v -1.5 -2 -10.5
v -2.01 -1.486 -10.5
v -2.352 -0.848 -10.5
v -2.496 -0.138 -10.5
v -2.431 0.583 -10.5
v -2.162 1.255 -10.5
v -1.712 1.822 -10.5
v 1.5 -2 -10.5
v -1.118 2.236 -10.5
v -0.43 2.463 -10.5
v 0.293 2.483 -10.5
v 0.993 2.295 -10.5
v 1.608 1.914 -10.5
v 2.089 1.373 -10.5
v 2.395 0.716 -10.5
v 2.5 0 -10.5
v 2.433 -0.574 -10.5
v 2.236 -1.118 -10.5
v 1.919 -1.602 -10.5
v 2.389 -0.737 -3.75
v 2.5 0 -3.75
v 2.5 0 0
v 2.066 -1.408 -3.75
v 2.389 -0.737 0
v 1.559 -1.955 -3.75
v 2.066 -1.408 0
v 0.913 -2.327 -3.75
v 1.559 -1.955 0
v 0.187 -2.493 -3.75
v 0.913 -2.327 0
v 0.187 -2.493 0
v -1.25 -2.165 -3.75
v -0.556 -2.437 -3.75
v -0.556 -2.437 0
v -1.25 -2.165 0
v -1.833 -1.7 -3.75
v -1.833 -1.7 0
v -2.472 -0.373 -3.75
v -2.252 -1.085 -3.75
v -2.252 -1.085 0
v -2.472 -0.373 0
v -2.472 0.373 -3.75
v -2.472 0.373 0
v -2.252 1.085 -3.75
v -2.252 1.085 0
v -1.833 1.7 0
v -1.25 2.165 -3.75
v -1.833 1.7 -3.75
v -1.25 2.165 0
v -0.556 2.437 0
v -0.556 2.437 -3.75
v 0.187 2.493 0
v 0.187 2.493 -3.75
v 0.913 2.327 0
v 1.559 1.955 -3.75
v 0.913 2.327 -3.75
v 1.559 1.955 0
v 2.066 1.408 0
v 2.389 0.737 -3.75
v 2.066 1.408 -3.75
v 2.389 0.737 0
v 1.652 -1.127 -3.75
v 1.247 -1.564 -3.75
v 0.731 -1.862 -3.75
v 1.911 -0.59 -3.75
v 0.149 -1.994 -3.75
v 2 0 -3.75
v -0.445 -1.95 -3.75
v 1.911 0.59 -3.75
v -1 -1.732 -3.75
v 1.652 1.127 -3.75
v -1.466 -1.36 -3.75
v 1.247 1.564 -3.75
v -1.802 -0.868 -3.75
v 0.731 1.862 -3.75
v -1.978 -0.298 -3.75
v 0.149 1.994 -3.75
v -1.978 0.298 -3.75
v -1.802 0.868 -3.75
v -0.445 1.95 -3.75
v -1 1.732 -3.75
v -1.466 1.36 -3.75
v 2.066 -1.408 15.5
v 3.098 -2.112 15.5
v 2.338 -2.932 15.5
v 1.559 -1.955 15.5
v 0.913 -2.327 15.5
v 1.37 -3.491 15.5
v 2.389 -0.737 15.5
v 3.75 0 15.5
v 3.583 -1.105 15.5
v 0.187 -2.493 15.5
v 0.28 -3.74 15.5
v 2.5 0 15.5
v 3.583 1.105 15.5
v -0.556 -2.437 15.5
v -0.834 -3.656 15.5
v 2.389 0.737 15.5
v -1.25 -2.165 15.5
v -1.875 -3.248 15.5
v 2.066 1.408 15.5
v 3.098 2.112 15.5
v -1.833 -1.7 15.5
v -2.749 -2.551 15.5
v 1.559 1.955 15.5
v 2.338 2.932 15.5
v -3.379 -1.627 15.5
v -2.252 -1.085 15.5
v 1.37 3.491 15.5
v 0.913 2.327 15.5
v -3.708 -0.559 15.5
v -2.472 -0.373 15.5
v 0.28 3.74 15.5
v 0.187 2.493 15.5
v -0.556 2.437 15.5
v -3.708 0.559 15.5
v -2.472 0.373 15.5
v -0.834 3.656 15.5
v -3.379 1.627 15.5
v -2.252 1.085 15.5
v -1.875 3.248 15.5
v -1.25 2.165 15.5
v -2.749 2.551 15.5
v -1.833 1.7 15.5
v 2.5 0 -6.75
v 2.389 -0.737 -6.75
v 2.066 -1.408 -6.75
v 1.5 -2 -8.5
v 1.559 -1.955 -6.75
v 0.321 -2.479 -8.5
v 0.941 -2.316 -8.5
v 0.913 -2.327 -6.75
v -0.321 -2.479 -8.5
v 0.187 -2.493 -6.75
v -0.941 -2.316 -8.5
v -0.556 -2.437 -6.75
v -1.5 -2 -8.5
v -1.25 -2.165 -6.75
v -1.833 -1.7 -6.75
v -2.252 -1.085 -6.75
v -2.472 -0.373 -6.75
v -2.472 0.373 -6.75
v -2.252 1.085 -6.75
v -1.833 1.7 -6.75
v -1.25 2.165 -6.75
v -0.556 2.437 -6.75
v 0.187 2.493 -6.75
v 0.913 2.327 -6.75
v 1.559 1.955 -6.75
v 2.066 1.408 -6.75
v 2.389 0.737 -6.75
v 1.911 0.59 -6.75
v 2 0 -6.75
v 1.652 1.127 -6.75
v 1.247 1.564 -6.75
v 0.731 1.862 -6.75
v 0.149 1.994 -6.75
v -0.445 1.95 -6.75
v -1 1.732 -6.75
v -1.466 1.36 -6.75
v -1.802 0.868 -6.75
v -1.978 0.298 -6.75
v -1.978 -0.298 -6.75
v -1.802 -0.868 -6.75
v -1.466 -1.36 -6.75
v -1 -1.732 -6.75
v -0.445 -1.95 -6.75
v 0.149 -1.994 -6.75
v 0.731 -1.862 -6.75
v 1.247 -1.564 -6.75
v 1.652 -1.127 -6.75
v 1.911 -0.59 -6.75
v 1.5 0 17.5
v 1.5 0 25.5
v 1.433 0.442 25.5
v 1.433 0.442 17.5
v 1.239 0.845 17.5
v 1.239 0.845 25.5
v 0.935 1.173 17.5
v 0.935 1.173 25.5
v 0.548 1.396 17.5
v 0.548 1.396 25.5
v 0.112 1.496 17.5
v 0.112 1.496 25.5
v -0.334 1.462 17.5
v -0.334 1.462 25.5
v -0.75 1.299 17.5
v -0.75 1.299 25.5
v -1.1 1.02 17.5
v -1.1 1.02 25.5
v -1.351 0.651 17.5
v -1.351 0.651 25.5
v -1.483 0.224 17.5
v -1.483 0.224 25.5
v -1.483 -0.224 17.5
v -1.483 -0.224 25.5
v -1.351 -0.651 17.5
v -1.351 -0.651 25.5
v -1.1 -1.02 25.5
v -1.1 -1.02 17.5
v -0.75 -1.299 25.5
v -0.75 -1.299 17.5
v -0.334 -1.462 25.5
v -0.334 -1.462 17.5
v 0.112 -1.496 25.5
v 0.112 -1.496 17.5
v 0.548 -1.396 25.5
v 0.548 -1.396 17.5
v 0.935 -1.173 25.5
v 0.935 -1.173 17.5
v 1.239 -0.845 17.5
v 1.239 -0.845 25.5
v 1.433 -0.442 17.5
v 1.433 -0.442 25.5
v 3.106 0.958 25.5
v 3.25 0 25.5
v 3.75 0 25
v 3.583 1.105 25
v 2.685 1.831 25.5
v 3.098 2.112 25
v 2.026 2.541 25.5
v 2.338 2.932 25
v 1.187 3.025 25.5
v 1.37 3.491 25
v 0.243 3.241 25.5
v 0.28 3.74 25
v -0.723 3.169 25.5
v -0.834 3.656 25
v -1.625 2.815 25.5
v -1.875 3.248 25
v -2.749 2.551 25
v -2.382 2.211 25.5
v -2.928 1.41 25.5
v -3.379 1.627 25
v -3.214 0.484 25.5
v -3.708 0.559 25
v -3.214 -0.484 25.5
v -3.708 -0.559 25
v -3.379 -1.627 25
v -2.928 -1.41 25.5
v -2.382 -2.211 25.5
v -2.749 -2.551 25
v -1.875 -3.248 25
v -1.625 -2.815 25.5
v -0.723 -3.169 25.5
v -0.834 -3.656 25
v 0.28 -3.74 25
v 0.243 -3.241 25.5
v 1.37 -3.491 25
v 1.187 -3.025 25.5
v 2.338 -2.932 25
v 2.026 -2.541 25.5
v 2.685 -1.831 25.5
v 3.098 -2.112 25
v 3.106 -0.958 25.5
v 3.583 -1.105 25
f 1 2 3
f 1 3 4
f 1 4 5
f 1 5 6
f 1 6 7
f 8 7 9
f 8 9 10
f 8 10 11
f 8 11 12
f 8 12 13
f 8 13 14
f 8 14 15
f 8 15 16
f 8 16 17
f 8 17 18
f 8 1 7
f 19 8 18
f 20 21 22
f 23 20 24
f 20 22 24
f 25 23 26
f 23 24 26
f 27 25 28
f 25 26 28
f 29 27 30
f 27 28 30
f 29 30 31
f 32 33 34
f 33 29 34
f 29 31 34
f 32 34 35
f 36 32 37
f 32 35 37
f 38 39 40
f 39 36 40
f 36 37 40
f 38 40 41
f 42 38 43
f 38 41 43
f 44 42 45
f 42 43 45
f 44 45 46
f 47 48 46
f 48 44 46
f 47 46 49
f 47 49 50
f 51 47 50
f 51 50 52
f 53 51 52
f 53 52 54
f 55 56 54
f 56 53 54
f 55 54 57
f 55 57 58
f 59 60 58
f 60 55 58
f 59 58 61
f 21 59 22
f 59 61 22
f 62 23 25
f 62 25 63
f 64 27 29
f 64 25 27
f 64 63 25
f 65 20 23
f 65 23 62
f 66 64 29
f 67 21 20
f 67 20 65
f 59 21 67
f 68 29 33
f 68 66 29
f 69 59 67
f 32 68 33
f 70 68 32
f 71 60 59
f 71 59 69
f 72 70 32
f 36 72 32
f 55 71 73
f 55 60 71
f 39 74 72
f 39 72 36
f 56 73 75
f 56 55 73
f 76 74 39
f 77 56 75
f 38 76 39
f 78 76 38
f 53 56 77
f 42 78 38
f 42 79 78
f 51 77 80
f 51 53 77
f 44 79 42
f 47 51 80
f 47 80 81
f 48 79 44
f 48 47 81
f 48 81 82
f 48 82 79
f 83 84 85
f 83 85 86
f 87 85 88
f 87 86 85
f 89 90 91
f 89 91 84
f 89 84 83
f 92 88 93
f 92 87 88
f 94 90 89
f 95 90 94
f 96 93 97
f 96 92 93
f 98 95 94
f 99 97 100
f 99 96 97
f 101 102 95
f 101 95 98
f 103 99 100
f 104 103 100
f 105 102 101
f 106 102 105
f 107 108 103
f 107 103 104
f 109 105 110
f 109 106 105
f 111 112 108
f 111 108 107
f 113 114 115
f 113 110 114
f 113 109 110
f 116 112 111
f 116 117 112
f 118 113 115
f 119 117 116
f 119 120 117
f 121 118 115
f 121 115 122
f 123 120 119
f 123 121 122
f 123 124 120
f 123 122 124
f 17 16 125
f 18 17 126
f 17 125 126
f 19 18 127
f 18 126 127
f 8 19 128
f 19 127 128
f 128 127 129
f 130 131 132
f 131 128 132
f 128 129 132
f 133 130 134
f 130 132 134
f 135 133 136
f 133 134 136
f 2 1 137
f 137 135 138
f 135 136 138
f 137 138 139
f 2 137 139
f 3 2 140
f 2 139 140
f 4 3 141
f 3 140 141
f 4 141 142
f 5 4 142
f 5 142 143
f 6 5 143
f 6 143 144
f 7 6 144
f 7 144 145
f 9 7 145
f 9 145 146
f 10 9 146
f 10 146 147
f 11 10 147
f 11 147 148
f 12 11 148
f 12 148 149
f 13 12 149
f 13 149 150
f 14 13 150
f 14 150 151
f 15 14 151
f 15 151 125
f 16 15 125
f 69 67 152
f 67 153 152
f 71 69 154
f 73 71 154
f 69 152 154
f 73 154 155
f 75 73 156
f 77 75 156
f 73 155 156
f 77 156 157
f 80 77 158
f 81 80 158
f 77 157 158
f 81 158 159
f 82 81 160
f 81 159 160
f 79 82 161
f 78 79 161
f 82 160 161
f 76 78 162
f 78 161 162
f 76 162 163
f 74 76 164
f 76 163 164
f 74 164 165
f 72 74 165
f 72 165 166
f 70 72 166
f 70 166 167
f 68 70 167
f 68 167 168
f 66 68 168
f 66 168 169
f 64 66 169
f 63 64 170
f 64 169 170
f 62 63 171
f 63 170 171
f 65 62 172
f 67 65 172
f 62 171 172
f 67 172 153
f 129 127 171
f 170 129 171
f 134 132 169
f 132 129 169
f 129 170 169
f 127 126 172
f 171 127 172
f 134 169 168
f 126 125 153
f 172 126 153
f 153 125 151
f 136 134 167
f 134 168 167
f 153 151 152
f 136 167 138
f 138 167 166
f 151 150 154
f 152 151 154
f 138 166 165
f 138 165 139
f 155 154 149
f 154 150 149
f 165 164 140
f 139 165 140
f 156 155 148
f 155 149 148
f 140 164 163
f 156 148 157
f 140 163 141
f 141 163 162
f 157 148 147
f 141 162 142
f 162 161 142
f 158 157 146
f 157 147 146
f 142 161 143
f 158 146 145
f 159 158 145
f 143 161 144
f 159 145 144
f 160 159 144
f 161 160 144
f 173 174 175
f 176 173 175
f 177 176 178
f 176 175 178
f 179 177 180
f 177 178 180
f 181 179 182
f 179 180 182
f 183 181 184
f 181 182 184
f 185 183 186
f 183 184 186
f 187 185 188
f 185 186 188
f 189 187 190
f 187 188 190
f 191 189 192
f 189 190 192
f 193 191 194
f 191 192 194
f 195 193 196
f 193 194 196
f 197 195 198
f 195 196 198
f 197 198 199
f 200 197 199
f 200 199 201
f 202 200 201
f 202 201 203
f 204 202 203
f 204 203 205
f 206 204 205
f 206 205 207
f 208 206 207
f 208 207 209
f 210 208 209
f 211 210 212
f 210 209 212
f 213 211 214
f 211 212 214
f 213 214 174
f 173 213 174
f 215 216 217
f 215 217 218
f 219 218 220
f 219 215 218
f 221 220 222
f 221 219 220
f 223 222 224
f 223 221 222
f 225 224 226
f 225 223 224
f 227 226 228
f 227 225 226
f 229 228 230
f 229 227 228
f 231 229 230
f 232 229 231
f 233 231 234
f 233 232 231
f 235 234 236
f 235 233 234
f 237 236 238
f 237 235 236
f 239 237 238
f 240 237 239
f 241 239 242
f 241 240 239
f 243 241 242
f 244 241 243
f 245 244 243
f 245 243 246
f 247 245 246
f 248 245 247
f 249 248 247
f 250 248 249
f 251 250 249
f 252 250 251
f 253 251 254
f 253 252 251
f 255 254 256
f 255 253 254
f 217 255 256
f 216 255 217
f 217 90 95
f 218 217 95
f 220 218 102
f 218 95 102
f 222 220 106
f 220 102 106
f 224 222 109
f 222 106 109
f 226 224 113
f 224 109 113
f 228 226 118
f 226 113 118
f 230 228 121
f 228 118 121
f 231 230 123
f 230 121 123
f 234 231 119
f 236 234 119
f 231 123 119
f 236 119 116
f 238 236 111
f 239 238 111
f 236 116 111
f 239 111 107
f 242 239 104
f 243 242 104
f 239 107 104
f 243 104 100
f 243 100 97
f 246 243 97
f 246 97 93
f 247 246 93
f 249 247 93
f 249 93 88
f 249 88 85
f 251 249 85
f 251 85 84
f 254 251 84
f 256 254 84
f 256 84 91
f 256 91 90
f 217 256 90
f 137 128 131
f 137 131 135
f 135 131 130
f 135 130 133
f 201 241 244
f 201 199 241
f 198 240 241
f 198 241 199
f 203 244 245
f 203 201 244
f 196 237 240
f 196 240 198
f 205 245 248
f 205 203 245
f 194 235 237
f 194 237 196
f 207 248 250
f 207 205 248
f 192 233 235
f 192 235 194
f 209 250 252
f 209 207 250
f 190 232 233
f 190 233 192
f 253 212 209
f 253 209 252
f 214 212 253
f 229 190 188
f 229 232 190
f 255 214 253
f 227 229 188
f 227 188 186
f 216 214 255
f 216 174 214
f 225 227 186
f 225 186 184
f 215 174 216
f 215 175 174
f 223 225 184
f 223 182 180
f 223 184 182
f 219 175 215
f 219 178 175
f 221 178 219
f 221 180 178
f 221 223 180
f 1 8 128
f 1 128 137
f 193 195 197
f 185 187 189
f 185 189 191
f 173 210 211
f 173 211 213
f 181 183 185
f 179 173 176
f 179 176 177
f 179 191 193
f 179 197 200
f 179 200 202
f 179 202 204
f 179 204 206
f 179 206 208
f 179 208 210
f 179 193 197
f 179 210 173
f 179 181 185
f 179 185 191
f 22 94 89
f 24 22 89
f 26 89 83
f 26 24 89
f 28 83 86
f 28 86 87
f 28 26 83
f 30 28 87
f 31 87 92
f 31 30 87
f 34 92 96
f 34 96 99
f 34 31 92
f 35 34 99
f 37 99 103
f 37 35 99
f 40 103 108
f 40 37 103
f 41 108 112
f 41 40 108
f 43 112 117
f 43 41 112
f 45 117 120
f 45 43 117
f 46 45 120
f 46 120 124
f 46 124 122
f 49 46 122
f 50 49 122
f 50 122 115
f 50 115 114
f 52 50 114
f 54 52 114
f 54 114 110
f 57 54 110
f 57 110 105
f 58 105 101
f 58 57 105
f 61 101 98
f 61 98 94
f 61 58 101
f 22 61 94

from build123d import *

# Parameters (mm, degrees)
ESQUISSE1_R             = 3.75
EXTRUSION1_DEPTH        = 25.5
ESQUISSE2_R             = 2.5
EXTRUSION2_DEPTH        = 10.5
ESQUISSE3_R             = 1.5
ENL_V_MAT_EXTRU_1_DEPTH = 8
ESQUISSE5_W             = 3.097754454
ESQUISSE5_H             = 3
ESQUISSE6_W             = 5.14619883
ESQUISSE6_H             = 0.986249407
ENL_V_MAT_EXTRU_3_DEPTH = 2
ESQUISSE8_OUTSIDE_W     = 17.006
ESQUISSE8_OUTSIDE_H     = 17.006
ESQUISSE8_OUTSIDE_R     = 2.5
EXTRUSION5_DEPTH        = 15.5
CHANFREIN1_SIZE         = 0.5


with BuildPart() as part:
    # Esquisse1 → Extrusion1 (new body)
    with BuildSketch(Plane.XY):
        Circle(ESQUISSE1_R)
    extrude(amount=EXTRUSION1_DEPTH)

    # Esquisse2 → Extrusion2 (add)
    with BuildSketch(Plane(origin=(0, 0, 0), x_dir=(-1, 0, 0), z_dir=(0, 0, -1))):
        with Locations(Location((0, 0, 0), (0, 0, 180))):
            Circle(ESQUISSE2_R)
    extrude(amount=EXTRUSION2_DEPTH)

    # Esquisse3 → Enlèv. mat.-Extru.1 (cut)
    with BuildSketch(Plane.XY.offset(25.5)):
        Circle(ESQUISSE3_R)
    extrude(amount=-ENL_V_MAT_EXTRU_1_DEPTH, mode=Mode.SUBTRACT)

    # Esquisse5 → Enlèvement de matière-Révolution1 (revolve, cut)
    with BuildSketch(Plane(origin=(0, 0, 0), x_dir=(1, 0, 0), z_dir=(0, 1, 0))):
        with Locations((3.548877227, 5.25)):
            Rectangle(ESQUISSE5_W, ESQUISSE5_H)
    revolve(axis=Axis((0, 0, -10.5), (0, 0, 1)), mode=Mode.SUBTRACT)

    # Esquisse6 → Enlèv. mat.-Extru.3 (cut)
    with BuildSketch(Plane(origin=(0, 0, -10.5), x_dir=(-1, 0, 0), z_dir=(0, 0, -1))):
        with Locations((0.031610558, -2.493124704)):
            Rectangle(ESQUISSE6_W, ESQUISSE6_H)
    extrude(amount=-ENL_V_MAT_EXTRU_3_DEPTH, mode=Mode.SUBTRACT)

    # Esquisse8 outside → Extrusion5 (cut)
    with BuildSketch(Plane(origin=(0, 0, 0), x_dir=(-1, 0, 0), z_dir=(0, 0, -1))):
        Rectangle(ESQUISSE8_OUTSIDE_W, ESQUISSE8_OUTSIDE_H)
        with Locations(Location((0, 0, 0), (0, 0, 180))):
            Circle(ESQUISSE8_OUTSIDE_R, mode=Mode.SUBTRACT)
    extrude(amount=-EXTRUSION5_DEPTH, mode=Mode.SUBTRACT)

    # Chanfrein1
    chanfrein1_edges = [part.edges().sort_by_distance(p)[0] for p in [
        (-3.75, 0, 25.5),
    ]]
    chamfer(chanfrein1_edges, length=CHANFREIN1_SIZE)


solid = part.part
